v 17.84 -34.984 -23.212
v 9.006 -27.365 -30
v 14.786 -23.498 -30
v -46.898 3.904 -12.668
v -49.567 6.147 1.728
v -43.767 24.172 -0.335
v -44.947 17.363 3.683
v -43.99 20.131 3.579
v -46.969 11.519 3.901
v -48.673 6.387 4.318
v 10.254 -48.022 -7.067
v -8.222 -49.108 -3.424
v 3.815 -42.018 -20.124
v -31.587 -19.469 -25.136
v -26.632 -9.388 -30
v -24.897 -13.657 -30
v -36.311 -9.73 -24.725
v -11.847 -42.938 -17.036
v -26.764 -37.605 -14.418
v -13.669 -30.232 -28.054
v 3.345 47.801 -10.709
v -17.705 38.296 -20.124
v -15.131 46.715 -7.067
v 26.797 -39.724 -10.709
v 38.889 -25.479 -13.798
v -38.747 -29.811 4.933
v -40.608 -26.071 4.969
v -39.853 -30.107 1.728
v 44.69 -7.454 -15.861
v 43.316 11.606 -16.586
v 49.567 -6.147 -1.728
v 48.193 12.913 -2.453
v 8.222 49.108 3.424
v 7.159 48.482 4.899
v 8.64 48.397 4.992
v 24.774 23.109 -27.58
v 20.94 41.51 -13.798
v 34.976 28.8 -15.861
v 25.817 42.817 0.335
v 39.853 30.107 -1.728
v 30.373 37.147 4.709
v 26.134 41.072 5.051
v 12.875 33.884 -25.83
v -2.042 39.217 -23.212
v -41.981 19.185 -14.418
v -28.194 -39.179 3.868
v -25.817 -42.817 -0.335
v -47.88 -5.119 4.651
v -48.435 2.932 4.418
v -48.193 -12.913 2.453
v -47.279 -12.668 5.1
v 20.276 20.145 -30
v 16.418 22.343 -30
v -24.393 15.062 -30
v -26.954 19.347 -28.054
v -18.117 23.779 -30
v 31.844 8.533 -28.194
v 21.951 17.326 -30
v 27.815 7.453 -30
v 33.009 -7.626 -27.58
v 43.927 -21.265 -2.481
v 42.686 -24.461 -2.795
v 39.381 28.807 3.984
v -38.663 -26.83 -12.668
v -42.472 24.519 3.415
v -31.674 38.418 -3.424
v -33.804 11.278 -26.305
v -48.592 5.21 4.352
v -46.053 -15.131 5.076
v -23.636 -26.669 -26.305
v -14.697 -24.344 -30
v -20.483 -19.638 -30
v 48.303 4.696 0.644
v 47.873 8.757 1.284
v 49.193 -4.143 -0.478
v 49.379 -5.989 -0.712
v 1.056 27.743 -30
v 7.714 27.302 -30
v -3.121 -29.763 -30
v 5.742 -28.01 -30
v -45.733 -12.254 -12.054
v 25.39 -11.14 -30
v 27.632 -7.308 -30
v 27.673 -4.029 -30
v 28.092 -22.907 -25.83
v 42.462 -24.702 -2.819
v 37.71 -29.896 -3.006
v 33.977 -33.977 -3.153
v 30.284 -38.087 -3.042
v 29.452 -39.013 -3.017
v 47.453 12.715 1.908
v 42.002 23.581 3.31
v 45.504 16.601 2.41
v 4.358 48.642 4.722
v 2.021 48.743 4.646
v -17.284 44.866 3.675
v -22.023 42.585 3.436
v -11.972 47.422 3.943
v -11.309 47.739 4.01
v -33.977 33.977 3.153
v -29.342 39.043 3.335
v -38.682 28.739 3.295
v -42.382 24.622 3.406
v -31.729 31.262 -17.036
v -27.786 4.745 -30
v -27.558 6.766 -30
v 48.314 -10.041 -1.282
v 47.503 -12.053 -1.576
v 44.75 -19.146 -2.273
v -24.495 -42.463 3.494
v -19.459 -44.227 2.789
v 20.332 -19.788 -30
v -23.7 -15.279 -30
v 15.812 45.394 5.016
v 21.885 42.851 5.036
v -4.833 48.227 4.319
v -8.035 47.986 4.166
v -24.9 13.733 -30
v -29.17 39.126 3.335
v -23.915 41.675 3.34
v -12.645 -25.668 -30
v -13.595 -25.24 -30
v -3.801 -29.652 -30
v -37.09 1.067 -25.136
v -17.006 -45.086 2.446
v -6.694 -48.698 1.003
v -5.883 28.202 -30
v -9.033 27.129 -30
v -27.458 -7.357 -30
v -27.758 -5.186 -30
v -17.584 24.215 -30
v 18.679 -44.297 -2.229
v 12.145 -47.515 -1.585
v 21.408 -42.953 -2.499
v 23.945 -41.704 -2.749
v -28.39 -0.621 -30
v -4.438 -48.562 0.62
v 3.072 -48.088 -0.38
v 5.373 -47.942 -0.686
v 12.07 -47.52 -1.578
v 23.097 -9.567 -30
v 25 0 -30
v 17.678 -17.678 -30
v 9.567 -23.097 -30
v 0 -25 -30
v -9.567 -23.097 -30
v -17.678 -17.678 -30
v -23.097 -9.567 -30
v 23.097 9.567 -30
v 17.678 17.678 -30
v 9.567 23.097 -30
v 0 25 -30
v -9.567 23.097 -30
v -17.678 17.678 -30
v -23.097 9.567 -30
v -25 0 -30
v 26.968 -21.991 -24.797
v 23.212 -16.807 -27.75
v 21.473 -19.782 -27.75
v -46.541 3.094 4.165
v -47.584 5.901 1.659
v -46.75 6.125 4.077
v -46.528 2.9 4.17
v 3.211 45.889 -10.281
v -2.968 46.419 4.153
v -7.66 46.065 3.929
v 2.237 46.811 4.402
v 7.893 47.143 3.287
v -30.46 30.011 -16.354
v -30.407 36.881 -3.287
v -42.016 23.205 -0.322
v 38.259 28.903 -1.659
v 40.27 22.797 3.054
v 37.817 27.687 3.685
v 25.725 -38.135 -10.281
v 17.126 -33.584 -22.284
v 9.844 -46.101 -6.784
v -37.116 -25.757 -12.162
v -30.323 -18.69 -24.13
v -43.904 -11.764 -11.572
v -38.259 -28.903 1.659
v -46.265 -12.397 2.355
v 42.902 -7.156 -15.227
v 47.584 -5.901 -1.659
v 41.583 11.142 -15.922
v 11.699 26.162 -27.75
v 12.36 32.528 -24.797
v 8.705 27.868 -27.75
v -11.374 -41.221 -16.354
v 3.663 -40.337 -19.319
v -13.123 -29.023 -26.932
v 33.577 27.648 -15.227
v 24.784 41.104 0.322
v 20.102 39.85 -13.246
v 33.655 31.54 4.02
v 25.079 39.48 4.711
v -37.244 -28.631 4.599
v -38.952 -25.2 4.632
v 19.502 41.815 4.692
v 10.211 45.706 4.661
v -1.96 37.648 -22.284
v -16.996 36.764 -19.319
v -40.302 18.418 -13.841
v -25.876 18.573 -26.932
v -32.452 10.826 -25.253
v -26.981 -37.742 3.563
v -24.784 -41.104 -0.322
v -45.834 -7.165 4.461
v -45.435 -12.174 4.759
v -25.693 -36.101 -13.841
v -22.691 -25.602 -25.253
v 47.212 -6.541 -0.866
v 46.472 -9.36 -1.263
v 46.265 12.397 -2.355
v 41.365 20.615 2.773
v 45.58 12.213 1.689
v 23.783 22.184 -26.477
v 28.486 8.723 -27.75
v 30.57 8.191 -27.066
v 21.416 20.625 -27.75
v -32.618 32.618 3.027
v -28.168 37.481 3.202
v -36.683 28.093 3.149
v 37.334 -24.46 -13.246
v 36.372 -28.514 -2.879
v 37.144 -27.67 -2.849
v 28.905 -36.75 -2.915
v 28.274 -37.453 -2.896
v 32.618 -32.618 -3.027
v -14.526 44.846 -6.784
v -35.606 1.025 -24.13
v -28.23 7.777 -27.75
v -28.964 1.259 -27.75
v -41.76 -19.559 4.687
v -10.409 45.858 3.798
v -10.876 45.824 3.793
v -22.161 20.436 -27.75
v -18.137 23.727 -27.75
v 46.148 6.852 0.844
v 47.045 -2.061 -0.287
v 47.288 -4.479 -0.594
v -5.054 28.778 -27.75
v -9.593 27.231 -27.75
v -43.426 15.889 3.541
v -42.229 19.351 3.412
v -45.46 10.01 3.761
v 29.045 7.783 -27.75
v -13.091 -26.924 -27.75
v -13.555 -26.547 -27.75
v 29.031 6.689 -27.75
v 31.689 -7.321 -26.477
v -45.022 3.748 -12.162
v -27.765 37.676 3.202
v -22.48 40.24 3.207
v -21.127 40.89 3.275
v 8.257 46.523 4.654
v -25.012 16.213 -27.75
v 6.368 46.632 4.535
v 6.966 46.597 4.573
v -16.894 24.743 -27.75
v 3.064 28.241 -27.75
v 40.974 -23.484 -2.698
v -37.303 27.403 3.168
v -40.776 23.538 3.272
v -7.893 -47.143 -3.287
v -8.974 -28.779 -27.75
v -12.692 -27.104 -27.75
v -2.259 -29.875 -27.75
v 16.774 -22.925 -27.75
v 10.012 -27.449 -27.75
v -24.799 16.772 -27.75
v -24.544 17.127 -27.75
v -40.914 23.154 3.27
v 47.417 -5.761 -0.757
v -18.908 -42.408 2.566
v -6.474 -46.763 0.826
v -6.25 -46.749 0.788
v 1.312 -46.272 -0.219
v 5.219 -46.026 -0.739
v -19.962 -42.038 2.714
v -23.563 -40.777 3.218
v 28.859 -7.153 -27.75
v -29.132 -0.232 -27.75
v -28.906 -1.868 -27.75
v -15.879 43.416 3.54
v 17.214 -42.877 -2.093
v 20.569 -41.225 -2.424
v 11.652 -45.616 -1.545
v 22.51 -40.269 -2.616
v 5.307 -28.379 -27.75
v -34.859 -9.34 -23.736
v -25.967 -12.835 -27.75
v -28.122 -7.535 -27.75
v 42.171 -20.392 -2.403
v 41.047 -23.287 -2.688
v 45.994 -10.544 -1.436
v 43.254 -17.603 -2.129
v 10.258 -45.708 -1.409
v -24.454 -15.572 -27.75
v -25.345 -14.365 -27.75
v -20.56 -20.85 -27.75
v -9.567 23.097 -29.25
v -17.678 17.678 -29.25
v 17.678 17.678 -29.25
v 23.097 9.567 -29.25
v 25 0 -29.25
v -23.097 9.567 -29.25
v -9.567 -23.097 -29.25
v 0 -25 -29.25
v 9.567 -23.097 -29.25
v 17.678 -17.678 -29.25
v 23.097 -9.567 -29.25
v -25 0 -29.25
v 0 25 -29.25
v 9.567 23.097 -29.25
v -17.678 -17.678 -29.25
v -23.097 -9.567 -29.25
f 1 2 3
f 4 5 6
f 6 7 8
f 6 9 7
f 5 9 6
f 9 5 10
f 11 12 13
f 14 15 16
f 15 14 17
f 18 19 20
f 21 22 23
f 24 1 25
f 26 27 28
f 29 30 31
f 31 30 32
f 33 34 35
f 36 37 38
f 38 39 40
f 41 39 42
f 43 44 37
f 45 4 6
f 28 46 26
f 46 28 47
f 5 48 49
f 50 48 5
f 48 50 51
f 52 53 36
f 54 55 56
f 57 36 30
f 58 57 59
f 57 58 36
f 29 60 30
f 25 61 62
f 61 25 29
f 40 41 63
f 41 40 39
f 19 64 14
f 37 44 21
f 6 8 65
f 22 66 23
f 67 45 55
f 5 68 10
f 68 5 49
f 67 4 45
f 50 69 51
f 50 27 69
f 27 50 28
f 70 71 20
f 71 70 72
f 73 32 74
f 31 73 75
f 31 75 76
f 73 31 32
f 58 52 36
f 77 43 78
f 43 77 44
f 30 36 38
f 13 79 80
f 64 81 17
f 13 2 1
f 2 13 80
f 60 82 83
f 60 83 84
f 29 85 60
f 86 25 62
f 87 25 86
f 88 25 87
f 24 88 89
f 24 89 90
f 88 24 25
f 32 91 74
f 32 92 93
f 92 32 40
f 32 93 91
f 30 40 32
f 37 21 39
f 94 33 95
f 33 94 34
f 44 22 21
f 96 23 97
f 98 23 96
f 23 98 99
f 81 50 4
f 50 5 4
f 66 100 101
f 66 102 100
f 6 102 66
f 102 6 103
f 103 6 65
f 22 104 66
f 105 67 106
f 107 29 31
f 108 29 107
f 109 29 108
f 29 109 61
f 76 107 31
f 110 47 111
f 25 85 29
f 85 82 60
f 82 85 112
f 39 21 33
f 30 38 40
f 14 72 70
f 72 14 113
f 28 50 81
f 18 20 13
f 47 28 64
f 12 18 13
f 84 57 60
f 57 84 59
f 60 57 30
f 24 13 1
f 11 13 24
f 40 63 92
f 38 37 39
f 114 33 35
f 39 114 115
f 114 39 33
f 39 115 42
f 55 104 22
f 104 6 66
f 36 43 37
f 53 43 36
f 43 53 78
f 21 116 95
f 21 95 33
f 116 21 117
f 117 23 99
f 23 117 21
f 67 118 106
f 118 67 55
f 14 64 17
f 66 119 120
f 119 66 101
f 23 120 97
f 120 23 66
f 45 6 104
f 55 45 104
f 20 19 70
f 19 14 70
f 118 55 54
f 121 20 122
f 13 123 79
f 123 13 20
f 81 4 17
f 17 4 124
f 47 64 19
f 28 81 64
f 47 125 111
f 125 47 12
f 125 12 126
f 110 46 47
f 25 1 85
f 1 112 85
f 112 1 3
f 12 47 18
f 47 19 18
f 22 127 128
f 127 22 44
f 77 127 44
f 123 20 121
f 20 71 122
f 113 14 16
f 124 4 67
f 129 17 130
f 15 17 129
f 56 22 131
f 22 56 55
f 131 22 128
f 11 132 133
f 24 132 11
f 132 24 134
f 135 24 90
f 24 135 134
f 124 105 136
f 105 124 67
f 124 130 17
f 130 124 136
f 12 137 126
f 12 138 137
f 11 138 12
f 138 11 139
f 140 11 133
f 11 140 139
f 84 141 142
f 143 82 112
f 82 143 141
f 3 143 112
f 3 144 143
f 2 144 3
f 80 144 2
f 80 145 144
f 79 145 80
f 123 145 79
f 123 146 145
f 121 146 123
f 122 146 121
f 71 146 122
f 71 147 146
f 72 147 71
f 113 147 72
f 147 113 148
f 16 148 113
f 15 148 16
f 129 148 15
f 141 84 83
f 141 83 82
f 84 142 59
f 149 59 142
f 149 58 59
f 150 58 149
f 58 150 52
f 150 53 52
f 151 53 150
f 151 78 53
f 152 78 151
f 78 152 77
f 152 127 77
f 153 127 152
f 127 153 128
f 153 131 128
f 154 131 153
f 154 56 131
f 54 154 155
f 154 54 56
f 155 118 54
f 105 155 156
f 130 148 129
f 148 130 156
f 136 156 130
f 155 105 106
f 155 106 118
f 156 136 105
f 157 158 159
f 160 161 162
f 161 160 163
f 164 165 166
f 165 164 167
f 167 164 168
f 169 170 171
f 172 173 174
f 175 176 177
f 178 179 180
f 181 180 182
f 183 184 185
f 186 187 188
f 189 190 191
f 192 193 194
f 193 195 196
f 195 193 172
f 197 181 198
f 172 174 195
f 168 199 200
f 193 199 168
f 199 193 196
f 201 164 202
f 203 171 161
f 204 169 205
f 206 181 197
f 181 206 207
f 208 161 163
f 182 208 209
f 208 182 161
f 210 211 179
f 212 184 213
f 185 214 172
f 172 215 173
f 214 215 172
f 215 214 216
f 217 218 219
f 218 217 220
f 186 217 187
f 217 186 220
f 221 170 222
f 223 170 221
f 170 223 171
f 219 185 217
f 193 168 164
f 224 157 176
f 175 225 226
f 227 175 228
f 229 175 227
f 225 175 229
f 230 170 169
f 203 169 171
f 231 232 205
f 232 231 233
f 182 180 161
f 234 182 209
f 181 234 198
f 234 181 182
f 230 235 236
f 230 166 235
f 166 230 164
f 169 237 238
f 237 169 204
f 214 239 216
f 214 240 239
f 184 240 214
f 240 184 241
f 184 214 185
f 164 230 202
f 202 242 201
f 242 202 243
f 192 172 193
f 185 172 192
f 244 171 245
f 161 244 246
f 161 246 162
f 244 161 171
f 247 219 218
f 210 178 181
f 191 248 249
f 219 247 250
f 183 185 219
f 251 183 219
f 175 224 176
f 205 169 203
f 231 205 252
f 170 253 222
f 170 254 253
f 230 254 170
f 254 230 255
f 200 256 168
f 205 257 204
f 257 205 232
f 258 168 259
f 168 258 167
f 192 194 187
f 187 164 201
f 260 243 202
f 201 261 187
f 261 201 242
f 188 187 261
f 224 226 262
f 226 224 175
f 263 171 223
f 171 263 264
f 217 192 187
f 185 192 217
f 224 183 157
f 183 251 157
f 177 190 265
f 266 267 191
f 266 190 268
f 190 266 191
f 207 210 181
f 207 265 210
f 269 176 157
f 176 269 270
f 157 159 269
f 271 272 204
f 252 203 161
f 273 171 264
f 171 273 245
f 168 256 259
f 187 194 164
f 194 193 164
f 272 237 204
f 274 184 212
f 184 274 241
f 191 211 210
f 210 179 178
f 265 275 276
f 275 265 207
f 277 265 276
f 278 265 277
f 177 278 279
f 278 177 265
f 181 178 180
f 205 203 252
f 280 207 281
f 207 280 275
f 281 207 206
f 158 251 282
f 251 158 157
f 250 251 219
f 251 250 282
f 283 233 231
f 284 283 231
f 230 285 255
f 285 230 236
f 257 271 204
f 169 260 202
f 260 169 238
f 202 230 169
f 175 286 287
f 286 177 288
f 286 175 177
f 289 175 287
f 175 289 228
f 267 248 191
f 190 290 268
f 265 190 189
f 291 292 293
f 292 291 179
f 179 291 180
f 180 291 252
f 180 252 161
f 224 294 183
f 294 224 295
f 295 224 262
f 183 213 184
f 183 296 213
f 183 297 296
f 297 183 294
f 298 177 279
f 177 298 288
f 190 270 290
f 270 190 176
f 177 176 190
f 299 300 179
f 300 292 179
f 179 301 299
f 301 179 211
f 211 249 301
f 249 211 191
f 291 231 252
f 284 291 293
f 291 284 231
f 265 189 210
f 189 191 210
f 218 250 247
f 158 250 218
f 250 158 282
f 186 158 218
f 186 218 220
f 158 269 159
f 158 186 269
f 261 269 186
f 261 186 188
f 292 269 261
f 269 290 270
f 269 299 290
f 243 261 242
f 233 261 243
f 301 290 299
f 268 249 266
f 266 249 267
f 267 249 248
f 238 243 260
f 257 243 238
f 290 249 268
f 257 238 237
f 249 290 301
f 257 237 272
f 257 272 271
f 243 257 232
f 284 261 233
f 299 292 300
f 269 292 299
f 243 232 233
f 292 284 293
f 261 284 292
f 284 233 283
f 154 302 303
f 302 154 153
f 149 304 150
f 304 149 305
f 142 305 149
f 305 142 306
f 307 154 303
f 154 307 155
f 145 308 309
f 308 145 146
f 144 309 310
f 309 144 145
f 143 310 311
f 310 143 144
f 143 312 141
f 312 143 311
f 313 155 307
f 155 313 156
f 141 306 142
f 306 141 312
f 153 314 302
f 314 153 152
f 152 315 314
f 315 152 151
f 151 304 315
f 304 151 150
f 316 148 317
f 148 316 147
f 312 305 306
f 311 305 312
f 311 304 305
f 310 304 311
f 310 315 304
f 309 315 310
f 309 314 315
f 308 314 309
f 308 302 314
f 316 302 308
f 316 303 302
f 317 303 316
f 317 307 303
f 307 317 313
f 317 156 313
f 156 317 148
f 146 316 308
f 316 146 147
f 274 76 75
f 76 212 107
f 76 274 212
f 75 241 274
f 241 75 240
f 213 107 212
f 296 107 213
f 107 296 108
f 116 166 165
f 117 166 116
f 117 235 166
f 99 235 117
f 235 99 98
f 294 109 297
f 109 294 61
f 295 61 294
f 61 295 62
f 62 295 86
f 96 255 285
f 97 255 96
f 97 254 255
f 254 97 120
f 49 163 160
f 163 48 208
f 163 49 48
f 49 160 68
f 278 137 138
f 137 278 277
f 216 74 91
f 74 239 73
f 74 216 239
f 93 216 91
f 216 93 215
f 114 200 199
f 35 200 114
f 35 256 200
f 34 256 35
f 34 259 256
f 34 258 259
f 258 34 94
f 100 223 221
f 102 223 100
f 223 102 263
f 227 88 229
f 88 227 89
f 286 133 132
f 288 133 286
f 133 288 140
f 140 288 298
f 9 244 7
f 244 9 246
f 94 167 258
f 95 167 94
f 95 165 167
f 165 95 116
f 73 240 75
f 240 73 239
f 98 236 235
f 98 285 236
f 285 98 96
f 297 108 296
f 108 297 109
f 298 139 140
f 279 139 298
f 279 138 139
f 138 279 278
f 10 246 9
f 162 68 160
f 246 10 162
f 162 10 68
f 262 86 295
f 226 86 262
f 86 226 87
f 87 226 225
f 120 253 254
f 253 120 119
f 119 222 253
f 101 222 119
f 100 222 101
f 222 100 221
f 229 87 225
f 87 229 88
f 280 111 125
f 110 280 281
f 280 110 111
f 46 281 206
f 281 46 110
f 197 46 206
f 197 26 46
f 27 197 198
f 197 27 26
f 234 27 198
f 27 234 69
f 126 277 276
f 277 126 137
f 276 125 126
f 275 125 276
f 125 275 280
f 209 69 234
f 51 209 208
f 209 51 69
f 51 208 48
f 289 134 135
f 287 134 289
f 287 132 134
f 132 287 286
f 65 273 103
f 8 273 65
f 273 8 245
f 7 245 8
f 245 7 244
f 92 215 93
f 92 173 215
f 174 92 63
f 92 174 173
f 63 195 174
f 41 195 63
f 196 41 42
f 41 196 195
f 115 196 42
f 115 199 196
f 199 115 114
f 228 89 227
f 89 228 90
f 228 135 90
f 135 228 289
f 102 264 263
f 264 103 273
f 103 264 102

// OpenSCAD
/*
This work is licensed under the Creative Commons Attribution-NonCommercial-ShareAlike 3.0 Unported License. To view a copy of this license, visit http://creativecommons.org/licenses/by-nc-sa/3.0/

author: Eric Romano (@gelstudios on twitter)
title: Bowl Factory
about: these modules generate a bowl from a spherical section, with lots of parameters for customization.
version: 1.1

-------------------
module: bowl
description: generates a bowl, parameters are optional.
parameters: radius of bowl, wall thickness, wall spin, wall tilt, percent of bowl to retain after trimming the lip, angle of trim, z-angle of trim, resolution.
ex: bowl(60,3,.50,15,0,16);
note: higher resolutions look nice (32+), lower resolutions have a cool polygon look (try 5-16).

-------------------
module: prettycut
description: uses a cylinder to cut a rounded profile into the bowl. 
parameters: radius of cut, position of trim relative to center, angle of trim, z-angle of trim, resolution.
ex: prettycut(200,10,15,0,30)bowl(60,3,1,0,0,16);
note: prettycut is performed after the lip of the bowl is cut, so use 1 for bowl trim parameter if using it (see prettycut example). It looks best when the radius parameter is greater than the bowl's.
*/

BowlSize=50; //[10:300]
WallThickness=2; //[1:30]
//Higher values are "Smoother", Lower res has a cool polygon look.
BowlResolution=16; //[3:128]

CutType=1; //[0:Straight,1:Pretty]
CutAngle=5; //[0:90]
CutSpin=45; //[0:180]

//Percentage used by straight cut only
BowlTrim=50; //[0:100]
Trim=BowlTrim/100;

//Pretty cut only, zero is half way up the bowl.
PrettyCutOffset=0; //[-50:50]
PrettyCutResolution=100; //[3:128]
PrettyCutRadius=200; //[50:300]

/* [Shape] */
//Percentage
VerticalSquashOrStretch=75; //[25:300]
ZSquash=VerticalSquashOrStretch/100;
//Percentage
HorizontalSquashOrStretch=100; //[25:300]
YSquash=HorizontalSquashOrStretch/100;
//Percentage
DepthSquashOrStretch=100; //[25:300]
XSquash=DepthSquashOrStretch/100;

/* [Advanced] */
//Degrees
BowlWallSpin=15; //[0:180]
BowlWallXTilt=0; //[-90:90]
BowlWallYTilt=15; //[-90:90]


if (CutType==1){
	scale([XSquash,YSquash,ZSquash])
	prettycut(PrettyCutRadius,PrettyCutOffset,CutAngle,CutSpin,PrettyCutResolution)
	bowl(BowlSize,WallThickness,1,BowlWallSpin,BowlWallXTilt,BowlWallYTilt,0,0,BowlResolution);
} else {
	scale([XSquash,YSquash,ZSquash])
	bowl(BowlSize,WallThickness,Trim,BowlWallSpin,BowlWallXTilt,BowlWallYTilt,CutAngle,CutSpin,BowlResolution);
}

module bowl(size=50,wall=2,percenttrim=.60,spin=0,tilt=0,tilt2=0,cutangle=0,cutangle2=0,bowlres=50){
$fn=bowlres;
trimvol=2*size;
trimposition=trimvol*percenttrim;
trimbottom=size*.2;
bottomcut=size/2;
insphere=1-wall/size;

difference(){
	difference(){
		difference(){
			//outer wall
			intersection(){
				rotate([tilt,tilt2,spin])sphere(size);
				translate([0,0,trimbottom])
				cube([trimvol,trimvol,trimvol],center=true);
				}
			//inner wall
			intersection(){
				rotate([tilt,tilt2,spin])sphere(size*insphere);//rotate for face angle, need parameter
				translate([0,0,trimbottom*1.3])
				cube([trimvol,trimvol,trimvol],center=true);
				}
			}
		rotate([cutangle,0,cutangle2])
		translate([0,0,trimposition])
		cube([4*trimvol,4*trimvol,trimvol],center=true);
		}
	translate([0,0,-1.28*size])
	cylinder(bottomcut,bottomcut,bottomcut);
	}
}

module prettycut(pcutsize=200,offset=0,pcutangle=0,pcutangle2=0,pcutres=100){
$fn=pcutres;
radius=pcutsize;

difference(){
	child(0);

	translate([0,0,offset])
	rotate([pcutangle,0,pcutangle2])
	translate([0,0,radius])
	rotate([90,0,0])
	cylinder(4*radius,radius,radius,center=true);
	}
}
